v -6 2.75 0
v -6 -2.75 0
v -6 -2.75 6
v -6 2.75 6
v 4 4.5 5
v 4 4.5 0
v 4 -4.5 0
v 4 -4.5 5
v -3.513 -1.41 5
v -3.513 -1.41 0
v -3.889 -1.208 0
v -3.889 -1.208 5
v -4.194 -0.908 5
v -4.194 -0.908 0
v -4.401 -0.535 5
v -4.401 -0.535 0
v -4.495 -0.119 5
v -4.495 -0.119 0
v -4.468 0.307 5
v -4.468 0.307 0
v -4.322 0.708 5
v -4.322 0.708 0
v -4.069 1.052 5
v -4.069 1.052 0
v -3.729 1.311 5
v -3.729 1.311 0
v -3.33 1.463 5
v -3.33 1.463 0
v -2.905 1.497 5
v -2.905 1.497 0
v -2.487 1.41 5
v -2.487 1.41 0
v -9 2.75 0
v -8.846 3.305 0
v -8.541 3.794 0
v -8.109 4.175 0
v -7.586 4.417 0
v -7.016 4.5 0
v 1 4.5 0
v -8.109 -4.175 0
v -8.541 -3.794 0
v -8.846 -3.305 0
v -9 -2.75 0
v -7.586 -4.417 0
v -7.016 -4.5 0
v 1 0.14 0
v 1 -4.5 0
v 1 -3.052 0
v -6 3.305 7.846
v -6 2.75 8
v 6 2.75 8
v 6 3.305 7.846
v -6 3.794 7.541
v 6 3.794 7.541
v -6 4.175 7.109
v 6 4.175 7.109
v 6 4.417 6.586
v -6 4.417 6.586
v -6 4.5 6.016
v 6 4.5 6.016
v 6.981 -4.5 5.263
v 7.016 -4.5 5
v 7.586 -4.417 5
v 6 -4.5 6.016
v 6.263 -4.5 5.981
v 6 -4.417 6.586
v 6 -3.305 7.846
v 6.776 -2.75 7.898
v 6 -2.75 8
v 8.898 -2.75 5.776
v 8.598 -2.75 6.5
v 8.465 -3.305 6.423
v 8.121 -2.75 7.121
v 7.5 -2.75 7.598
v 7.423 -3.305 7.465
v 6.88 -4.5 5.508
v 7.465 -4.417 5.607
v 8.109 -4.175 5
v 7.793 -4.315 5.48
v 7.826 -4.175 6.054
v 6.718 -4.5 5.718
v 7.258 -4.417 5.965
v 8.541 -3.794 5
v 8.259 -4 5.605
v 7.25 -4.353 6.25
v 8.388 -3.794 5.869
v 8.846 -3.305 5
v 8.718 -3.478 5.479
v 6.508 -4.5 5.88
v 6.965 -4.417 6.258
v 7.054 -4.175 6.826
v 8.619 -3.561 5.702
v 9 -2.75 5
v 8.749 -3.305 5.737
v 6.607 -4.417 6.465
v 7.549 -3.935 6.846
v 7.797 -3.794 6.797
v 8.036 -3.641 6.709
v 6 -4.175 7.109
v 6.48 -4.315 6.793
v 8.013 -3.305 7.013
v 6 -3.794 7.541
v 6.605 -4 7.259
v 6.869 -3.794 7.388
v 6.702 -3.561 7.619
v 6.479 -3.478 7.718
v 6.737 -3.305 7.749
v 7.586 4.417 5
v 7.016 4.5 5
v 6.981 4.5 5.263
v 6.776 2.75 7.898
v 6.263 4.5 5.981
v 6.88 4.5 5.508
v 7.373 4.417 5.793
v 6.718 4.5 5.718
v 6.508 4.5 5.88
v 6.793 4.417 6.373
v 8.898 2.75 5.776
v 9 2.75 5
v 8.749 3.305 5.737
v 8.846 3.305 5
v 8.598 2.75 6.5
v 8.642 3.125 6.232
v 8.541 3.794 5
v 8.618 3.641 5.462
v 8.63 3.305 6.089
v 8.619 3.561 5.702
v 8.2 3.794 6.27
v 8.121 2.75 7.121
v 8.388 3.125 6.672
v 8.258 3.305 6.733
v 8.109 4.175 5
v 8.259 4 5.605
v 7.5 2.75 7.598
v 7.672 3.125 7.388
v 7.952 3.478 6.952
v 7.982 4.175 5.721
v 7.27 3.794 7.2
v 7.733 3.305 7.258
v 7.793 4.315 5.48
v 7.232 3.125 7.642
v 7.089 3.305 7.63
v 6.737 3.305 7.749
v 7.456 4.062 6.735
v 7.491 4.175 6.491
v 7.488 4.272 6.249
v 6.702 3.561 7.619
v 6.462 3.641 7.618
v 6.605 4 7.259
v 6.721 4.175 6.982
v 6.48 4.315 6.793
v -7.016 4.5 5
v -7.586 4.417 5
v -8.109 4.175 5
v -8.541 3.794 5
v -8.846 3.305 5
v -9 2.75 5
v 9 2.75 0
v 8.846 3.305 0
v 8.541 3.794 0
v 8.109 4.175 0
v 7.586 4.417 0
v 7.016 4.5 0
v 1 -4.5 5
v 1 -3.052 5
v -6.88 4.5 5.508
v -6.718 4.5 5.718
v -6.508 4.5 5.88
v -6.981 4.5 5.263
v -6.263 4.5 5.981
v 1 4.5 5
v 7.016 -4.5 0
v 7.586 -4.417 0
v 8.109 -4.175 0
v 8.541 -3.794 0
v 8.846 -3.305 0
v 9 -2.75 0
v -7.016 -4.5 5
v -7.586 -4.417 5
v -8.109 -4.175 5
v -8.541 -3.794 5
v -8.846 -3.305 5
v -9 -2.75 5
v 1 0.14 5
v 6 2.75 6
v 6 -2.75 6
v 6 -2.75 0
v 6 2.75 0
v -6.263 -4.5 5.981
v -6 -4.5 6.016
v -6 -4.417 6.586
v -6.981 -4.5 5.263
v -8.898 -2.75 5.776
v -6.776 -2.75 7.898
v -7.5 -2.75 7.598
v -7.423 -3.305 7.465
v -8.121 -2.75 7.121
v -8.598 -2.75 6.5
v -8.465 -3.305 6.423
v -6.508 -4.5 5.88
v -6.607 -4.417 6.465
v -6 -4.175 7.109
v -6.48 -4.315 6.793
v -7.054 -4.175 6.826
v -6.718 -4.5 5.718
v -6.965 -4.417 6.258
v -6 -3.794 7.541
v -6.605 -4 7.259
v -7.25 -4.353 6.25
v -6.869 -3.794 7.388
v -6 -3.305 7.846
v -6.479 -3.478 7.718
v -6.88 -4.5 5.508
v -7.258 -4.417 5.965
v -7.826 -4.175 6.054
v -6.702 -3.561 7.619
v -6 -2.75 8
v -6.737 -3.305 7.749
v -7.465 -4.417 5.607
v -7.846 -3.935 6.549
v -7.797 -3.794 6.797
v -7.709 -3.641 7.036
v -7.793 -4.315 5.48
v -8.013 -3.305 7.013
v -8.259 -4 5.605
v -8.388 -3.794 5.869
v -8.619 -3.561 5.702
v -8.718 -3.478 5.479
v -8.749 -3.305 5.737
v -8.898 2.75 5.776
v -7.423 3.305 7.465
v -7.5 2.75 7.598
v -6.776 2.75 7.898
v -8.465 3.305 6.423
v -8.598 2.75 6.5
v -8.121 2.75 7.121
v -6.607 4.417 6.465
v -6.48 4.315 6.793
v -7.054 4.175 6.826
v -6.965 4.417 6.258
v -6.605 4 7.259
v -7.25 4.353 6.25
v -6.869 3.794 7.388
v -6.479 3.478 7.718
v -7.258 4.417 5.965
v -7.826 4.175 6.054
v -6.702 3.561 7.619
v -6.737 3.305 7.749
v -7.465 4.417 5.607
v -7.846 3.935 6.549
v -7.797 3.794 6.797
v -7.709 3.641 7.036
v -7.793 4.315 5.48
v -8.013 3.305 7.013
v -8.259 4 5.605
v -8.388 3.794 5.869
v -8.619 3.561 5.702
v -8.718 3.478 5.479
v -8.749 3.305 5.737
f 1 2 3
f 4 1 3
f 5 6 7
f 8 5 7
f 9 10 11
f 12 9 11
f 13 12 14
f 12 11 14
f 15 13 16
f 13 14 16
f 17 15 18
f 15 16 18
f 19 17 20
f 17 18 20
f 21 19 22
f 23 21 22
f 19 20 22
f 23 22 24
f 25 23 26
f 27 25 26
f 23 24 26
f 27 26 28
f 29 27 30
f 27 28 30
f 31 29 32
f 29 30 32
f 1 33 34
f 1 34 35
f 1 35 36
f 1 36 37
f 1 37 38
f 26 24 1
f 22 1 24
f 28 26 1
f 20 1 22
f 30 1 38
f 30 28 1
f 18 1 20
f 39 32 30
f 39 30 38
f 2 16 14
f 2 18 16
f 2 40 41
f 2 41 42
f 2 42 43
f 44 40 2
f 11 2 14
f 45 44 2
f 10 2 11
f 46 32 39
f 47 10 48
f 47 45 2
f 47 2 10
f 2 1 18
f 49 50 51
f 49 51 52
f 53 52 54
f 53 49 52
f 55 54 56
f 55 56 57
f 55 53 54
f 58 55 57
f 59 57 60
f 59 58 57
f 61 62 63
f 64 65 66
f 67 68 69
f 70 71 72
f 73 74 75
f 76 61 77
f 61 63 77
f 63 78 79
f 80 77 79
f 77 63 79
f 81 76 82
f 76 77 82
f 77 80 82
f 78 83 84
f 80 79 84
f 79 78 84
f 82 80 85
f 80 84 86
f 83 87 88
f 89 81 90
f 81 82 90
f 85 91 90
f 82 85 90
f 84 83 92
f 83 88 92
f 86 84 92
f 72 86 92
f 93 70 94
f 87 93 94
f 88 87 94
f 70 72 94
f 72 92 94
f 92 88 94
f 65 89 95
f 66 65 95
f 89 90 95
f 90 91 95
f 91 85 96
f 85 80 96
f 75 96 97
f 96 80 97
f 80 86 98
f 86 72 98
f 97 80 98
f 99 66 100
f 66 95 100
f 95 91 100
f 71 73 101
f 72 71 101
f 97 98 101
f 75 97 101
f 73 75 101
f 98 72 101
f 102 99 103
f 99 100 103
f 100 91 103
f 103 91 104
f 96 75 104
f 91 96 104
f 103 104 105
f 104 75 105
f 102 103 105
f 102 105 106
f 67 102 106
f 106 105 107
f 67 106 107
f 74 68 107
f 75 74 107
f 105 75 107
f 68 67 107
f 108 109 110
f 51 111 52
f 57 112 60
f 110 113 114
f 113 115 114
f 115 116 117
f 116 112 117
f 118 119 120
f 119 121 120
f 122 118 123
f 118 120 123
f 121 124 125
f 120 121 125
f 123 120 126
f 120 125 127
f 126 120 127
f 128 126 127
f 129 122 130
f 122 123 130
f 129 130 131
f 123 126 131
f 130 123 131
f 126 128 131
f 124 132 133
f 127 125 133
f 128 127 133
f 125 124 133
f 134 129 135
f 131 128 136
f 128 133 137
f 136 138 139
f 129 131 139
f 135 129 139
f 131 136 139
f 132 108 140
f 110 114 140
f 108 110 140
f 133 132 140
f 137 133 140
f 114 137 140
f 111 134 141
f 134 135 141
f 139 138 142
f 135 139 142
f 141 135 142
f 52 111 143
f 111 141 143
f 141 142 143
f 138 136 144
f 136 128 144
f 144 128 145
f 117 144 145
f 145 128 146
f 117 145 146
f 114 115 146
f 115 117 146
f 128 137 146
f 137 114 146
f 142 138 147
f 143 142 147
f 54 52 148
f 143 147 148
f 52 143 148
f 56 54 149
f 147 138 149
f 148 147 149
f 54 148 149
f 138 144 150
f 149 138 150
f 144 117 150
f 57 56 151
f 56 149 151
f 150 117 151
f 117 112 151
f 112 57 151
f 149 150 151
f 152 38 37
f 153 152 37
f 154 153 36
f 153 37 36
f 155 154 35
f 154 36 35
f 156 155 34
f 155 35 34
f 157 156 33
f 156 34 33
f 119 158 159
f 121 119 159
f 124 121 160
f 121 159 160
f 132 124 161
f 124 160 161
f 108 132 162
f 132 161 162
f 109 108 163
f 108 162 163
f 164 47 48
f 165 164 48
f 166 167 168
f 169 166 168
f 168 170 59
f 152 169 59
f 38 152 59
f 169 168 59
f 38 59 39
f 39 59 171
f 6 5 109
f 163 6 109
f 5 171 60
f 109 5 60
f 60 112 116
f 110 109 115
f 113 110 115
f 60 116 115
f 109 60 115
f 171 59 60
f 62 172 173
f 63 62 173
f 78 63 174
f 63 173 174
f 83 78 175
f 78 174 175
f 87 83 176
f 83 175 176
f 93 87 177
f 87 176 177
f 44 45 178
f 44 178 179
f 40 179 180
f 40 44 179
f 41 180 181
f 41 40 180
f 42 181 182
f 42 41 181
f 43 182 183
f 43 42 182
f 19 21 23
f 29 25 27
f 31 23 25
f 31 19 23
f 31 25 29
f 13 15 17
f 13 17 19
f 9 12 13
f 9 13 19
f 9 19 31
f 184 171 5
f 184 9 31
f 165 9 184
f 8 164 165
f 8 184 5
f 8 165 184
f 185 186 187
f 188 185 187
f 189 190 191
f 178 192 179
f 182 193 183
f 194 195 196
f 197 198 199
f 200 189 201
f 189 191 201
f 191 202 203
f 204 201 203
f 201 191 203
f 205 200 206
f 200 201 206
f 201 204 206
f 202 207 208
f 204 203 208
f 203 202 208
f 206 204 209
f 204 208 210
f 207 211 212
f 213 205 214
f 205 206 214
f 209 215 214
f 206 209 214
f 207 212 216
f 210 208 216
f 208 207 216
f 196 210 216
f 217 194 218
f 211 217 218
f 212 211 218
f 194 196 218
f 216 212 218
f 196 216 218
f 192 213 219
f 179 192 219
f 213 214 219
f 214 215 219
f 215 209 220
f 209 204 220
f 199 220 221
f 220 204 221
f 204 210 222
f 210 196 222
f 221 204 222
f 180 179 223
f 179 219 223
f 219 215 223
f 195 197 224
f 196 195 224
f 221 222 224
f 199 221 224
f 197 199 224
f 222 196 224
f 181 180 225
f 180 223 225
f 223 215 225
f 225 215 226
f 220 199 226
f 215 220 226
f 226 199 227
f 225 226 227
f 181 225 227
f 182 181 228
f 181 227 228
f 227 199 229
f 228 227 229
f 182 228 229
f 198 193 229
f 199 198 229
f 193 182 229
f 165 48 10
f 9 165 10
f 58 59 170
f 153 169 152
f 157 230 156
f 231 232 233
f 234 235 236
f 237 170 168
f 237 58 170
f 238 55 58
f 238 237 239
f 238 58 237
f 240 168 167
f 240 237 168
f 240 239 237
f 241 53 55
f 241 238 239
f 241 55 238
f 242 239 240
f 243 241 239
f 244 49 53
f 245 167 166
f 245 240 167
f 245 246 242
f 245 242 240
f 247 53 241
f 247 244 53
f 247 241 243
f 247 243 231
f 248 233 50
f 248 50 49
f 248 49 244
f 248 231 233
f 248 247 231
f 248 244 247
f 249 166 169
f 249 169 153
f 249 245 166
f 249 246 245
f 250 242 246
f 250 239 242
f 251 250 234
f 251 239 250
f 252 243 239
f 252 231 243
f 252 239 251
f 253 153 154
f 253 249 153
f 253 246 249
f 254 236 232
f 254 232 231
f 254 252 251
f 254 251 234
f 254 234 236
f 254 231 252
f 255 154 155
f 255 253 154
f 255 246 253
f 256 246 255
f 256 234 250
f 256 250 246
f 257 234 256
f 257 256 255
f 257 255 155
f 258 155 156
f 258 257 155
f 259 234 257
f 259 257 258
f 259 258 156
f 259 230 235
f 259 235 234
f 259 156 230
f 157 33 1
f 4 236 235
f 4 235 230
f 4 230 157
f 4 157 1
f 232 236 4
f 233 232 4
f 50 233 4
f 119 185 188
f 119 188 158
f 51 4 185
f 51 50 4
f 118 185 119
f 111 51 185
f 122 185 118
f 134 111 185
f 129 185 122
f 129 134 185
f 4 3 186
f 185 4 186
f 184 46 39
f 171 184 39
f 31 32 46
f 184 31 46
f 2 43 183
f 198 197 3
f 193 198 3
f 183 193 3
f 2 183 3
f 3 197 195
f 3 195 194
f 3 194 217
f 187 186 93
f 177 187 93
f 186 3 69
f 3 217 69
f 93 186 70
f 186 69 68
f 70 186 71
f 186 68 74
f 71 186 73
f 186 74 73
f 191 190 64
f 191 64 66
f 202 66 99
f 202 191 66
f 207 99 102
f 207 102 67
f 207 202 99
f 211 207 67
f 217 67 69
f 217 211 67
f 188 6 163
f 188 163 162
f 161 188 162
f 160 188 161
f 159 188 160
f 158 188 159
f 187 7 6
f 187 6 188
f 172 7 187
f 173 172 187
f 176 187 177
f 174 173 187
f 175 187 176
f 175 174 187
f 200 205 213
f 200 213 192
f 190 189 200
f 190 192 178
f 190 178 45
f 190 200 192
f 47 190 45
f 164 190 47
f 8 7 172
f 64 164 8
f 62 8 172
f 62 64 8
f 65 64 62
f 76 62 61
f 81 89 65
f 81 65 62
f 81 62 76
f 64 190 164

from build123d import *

# Parameters (mm, degrees)
F1_DEPTH     = 4.5
F3_DEPTH     = 2.75
F5_DEPTH     = 5
F6_T1_DEPTH  = 9.9607837082
F6_T3_DEPTH  = 12
F6_T6_ANGLE  = 90
F6_T8_ANGLE  = 90
F6_T10_ANGLE = 90
F6_T12_ANGLE = 90


# Not quite as in the source:
# - a fillet or chamfer that OpenCascade refuses, or shapes differently, is made with other operations: its cross-section is extruded or revolved along the edge and cut away or added


with BuildPart() as f1:
    # F0 (on Front) → F1 (new body, symmetric)
    with BuildSketch(Plane.XZ):
        with BuildLine():
            Line((6, 8), (-6, 8))
            ThreePointArc((-6, 8), (-8.1213203436, 7.1213203436), (-9, 5))
            Line((-9, 5), (-9, 0))
            Line((-9, 0), (9, 0))
            Line((9, 0), (9, 5))
            ThreePointArc((9, 5), (8.1213203436, 7.1213203436), (6, 8))
        make_face()
    extrude(amount=F1_DEPTH, both=True)

    # F2 (on Front) → F3 (cut, symmetric)
    with BuildSketch(Plane.XZ):
        Polygon((-24, 24), (-24, 0), (-6, 0), (-6, 6), (6, 6), (6, 0), (24, 0), (24, 24), align=None)
    extrude(amount=F3_DEPTH, both=True, mode=Mode.SUBTRACT)

    # F4 (on face) → F5 (cut)
    with BuildSketch(Plane(origin=(0, 0, 0), x_dir=(1, 0, 0), z_dir=(0, 0, -1))):
        with BuildLine():
            Line((4, -6), (4, 6))
            Line((4, 6), (1, 6))
            Line((1, 6), (1, 3.0521475958))
            Line((1, 3.0521475958), (-3.513030215, 1.4095389312))
            ThreePointArc((-3.513030215, 1.4095389312), (-4.4095389312, -0.513030215), (-2.486969785, -1.4095389312))
            Line((-2.486969785, -1.4095389312), (1, -0.1403857216))
            Line((1, -0.1403857216), (1, -6))
            Line((1, -6), (4, -6))
        make_face()
    extrude(amount=-F5_DEPTH, mode=Mode.SUBTRACT)

    # F6: fillet of radius 2 on 2 edges, made by hand

    # F6_s2 → F6_t1 (cut)
    with BuildSketch(Plane.XY.offset(-4.9607837082)):
        with BuildLine():
            ThreePointArc((9, 2.75), (8.3385621722, 4), (7.0156865167, 4.5))
            Line((7.0156865167, 4.5), (9, 4.5))
            Line((9, 4.5), (9, 2.75))
        make_face()
        with BuildLine():
            ThreePointArc((-7.0156865167, 4.5), (-8.3385621722, 4), (-9, 2.75))
            Line((-9, 2.75), (-9, 4.5))
            Line((-9, 4.5), (-7.0156865167, 4.5))
        make_face()
        with BuildLine():
            ThreePointArc((-7.0156865167, -4.5), (-8.3385621722, -4), (-9, -2.75))
            Line((-9, -2.75), (-9, -4.5))
            Line((-9, -4.5), (-7.0156865167, -4.5))
        make_face()
        with BuildLine():
            ThreePointArc((7.0156865167, -4.5), (8.3385621722, -4), (9, -2.75))
            Line((9, -2.75), (9, -4.5))
            Line((9, -4.5), (7.0156865167, -4.5))
        make_face()
    extrude(amount=F6_T1_DEPTH, mode=Mode.SUBTRACT)

    # F6_s4 → F6_t3 (cut)
    with BuildSketch(Plane.YZ.offset(-6)):
        with BuildLine():
            ThreePointArc((2.75, 8), (4, 7.3385621722), (4.5, 6.0156865167))
            Line((4.5, 6.0156865167), (4.5, 8))
            Line((4.5, 8), (2.75, 8))
        make_face()
        with BuildLine():
            ThreePointArc((-4.5, 6.0156865167), (-4, 7.3385621722), (-2.75, 8))
            Line((-2.75, 8), (-4.5, 8))
            Line((-4.5, 8), (-4.5, 6.0156865167))
        make_face()
    extrude(amount=F6_T3_DEPTH, mode=Mode.SUBTRACT)

    # F6_s5 → F6_t6 (revolve, cut)
    with BuildSketch(Plane.YZ.offset(-6)):
        with BuildLine():
            ThreePointArc((-4.5, 6.0156865167), (-4, 7.3385621722), (-2.75, 8))
            Line((-2.75, 8), (-4.5, 8))
            Line((-4.5, 8), (-4.5, 6.0156865167))
        make_face()
    revolve(axis=Axis((-6, -4.5, 5), (0, -1, 0)), revolution_arc=F6_T6_ANGLE, mode=Mode.SUBTRACT)

    # F6_s7 → F6_t8 (revolve, cut)
    with BuildSketch(Plane.XY.offset(5)):
        with BuildLine():
            ThreePointArc((9, 2.75), (8.3385621722, 4), (7.0156865167, 4.5))
            Line((7.0156865167, 4.5), (9, 4.5))
            Line((9, 4.5), (9, 2.75))
        make_face()
    revolve(axis=Axis((6, 4.5, 5), (0, -1, 0)), revolution_arc=F6_T8_ANGLE, mode=Mode.SUBTRACT)

    # F6_s9 → F6_t10 (revolve, cut)
    with BuildSketch(Plane.YZ.offset(-6)):
        with BuildLine():
            ThreePointArc((4.5, 6.0156865167), (4, 7.3385621722), (2.75, 8))
            Line((2.75, 8), (4.5, 8))
            Line((4.5, 8), (4.5, 6.0156865167))
        make_face()
    revolve(axis=Axis((-6, 4.5, 5), (0, -1, 0)), revolution_arc=F6_T10_ANGLE, mode=Mode.SUBTRACT)

    # F6_s11 → F6_t12 (revolve, cut)
    with BuildSketch(Plane.XY.offset(5)):
        with BuildLine():
            ThreePointArc((7.0156865167, -4.5), (8.3385621722, -4), (9, -2.75))
            Line((9, -2.75), (9, -4.5))
            Line((9, -4.5), (7.0156865167, -4.5))
        make_face()
    revolve(axis=Axis((6, -4.5, 5), (0, -1, 0)), revolution_arc=F6_T12_ANGLE, mode=Mode.SUBTRACT)


solid = f1.part
